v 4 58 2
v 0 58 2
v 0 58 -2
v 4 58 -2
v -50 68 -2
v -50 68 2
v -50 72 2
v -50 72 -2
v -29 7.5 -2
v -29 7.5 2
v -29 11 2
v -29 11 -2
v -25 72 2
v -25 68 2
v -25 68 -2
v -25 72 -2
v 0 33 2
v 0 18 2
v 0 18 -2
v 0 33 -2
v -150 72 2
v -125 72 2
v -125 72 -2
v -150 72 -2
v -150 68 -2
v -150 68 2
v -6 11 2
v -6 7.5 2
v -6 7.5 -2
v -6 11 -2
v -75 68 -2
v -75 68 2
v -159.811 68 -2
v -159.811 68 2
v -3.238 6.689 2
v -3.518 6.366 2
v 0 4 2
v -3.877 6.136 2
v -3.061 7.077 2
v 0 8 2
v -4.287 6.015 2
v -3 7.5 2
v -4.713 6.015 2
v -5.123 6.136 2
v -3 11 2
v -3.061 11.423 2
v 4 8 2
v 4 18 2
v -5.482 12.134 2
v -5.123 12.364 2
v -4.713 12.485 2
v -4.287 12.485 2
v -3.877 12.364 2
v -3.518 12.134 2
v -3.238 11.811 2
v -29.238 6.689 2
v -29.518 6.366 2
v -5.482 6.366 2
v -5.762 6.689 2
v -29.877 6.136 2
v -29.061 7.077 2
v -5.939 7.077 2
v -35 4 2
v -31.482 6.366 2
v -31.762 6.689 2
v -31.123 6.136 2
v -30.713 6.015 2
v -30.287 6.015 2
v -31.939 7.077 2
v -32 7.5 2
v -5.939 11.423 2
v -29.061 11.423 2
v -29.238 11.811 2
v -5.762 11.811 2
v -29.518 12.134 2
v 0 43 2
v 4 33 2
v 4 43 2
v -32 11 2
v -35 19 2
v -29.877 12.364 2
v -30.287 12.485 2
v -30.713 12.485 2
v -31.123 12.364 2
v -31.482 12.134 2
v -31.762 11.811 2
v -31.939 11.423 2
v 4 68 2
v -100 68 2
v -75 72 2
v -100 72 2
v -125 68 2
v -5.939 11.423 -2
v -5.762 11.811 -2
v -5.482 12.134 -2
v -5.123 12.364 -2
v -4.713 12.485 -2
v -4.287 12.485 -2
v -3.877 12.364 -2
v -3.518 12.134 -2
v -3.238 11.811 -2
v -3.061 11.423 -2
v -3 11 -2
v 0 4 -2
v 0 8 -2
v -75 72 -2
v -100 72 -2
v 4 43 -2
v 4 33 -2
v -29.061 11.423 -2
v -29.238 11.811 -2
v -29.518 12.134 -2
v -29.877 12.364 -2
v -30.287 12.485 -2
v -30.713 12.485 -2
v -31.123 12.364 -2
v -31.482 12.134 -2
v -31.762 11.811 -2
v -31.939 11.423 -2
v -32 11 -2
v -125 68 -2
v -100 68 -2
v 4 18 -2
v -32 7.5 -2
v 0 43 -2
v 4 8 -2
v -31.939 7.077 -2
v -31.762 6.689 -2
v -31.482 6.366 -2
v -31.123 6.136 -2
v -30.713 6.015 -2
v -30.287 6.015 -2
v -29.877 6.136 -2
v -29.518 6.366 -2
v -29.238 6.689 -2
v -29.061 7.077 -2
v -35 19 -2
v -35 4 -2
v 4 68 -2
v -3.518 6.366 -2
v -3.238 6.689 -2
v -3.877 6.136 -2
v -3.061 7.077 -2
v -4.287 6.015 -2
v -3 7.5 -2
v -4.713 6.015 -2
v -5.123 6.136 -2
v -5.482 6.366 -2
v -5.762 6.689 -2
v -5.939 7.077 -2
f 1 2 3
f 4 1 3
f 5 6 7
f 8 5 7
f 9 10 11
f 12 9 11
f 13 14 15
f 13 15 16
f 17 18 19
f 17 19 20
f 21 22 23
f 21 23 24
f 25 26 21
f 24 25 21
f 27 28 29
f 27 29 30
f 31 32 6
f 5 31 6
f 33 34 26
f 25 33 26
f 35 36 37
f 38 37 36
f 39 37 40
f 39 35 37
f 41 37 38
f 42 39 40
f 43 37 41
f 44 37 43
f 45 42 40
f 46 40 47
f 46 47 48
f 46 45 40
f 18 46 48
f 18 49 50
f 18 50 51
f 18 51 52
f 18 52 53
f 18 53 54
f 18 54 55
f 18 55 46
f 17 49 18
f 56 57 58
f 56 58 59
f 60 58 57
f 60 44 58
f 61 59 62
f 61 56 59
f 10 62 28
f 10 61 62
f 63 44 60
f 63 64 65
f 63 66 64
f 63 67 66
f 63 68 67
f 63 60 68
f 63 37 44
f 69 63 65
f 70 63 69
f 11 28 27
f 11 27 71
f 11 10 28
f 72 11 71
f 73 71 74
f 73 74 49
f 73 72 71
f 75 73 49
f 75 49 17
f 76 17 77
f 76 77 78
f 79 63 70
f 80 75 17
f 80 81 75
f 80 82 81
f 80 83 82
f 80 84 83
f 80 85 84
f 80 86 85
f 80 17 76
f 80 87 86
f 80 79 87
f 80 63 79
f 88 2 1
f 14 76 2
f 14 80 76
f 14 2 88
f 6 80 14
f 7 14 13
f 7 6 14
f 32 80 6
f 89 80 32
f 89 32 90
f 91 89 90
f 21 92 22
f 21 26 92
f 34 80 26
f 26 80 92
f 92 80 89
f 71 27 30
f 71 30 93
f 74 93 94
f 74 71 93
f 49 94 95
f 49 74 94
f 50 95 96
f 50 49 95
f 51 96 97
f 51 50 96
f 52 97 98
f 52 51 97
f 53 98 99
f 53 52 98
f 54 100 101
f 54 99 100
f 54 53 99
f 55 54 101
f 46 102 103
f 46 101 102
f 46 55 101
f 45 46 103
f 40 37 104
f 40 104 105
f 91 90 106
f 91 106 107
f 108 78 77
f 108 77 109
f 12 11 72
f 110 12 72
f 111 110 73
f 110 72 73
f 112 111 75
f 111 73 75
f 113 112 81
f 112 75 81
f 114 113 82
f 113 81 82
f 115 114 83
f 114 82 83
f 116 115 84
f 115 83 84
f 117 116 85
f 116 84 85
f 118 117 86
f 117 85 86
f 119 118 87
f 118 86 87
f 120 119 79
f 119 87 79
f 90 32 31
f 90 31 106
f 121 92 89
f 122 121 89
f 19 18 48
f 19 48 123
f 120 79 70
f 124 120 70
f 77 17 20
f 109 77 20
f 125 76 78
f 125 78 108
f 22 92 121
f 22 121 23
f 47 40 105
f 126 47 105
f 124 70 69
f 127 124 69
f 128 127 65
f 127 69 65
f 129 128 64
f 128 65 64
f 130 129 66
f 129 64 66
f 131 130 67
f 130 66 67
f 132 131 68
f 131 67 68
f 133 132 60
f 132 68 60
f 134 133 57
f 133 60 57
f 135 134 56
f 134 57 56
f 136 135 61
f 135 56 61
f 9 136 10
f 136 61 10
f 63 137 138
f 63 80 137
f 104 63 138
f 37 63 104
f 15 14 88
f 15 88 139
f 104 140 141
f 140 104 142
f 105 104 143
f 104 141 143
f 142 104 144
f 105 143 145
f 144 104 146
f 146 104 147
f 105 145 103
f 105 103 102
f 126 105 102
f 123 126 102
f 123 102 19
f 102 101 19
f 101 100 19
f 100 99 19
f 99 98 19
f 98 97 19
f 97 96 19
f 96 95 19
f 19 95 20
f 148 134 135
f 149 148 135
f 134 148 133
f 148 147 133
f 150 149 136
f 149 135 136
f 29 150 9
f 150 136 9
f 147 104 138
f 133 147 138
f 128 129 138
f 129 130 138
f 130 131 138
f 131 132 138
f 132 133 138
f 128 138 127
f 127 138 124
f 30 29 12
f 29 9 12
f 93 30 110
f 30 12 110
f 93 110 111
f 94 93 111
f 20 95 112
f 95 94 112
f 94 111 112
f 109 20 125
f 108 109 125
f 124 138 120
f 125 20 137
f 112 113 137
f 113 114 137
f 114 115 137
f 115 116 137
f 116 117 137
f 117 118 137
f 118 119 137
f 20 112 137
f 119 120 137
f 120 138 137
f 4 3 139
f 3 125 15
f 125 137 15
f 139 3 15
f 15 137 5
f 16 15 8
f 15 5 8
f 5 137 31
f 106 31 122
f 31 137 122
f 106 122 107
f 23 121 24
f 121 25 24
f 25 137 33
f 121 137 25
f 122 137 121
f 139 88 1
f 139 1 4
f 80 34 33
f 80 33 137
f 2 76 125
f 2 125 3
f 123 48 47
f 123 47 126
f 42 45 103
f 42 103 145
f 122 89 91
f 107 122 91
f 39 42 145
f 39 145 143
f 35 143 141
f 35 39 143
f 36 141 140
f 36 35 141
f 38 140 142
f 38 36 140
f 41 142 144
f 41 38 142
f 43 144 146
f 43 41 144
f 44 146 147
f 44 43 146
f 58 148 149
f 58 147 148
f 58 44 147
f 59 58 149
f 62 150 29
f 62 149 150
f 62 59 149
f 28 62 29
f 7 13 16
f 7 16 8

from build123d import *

# Parameters (mm, degrees)
BOSS_EXTRUDE1_DEPTH = 2
CUT_EXTRUDE1_REACH  = 186.662
SKETCH3_W           = 25
SKETCH3_H           = 4
CUT_EXTRUDE2_DEPTH  = 185.661853126
SKETCH4_W           = 4
SKETCH4_H           = 10
BOSS_EXTRUDE2_DEPTH = 4


with BuildPart() as part:
    # Sketch1 → Boss-Extrude1 (new, symmetric)
    with BuildSketch(Plane.XY):
        Polygon((0, 4), (0, 72), (-170, 72), (-35, 19), (-35, 4), align=None)
    extrude(amount=BOSS_EXTRUDE1_DEPTH, both=True)

    # Sketch2 → Cut-Extrude1 (cut, up to next)
    with BuildSketch(Plane.XY.offset(2), mode=Mode.PRIVATE) as cut_extrude1_sk1:
        with BuildLine():
            Line((-3, 11), (-3, 7.5))
            ThreePointArc((-3, 7.5), (-4.5, 6), (-6, 7.5))
            Line((-6, 7.5), (-6, 11))
            ThreePointArc((-6, 11), (-4.5, 12.5), (-3, 11))
        make_face()
    cut_extrude1_tool1 = extrude(cut_extrude1_sk1.sketch, amount=-CUT_EXTRUDE1_REACH, mode=Mode.PRIVATE) & part.part
    # Sketch2 → Cut-Extrude1 (cut, up to next)
    with BuildSketch(Plane.XY.offset(2), mode=Mode.PRIVATE) as cut_extrude1_sk2:
        with BuildLine():
            Line((-32, 11), (-32, 7.5))
            ThreePointArc((-32, 7.5), (-30.5, 6), (-29, 7.5))
            Line((-29, 7.5), (-29, 11))
            ThreePointArc((-29, 11), (-30.5, 12.5), (-32, 11))
        make_face()
    cut_extrude1_tool2 = extrude(cut_extrude1_sk2.sketch, amount=-CUT_EXTRUDE1_REACH, mode=Mode.PRIVATE) & part.part
    add(cut_extrude1_tool1.solids().sort_by_distance((-4.5, 9.25, 2))[0], mode=Mode.SUBTRACT)
    add(cut_extrude1_tool2.solids().sort_by_distance((-30.5, 9.25, 2))[0], mode=Mode.SUBTRACT)

    # Sketch3 → Cut-Extrude2 (cut, through all)
    with BuildSketch(Plane.XY.offset(2)):
        with Locations((-62.5, 70)):
            Rectangle(SKETCH3_W, SKETCH3_H)
        with Locations((-12.5, 70)):
            Rectangle(SKETCH3_W, SKETCH3_H)
        with Locations((-112.5, 70)):
            Rectangle(SKETCH3_W, SKETCH3_H)
        with Locations((-162.5, 70)):
            Rectangle(SKETCH3_W, SKETCH3_H)
        with Locations((-212.5, 70)):
            Rectangle(SKETCH3_W, SKETCH3_H)
        with Locations((-262.5, 70)):
            Rectangle(SKETCH3_W, SKETCH3_H)
        with Locations((-312.5, 70)):
            Rectangle(SKETCH3_W, SKETCH3_H)
        with Locations((-362.5, 70)):
            Rectangle(SKETCH3_W, SKETCH3_H)
        with Locations((-412.5, 70)):
            Rectangle(SKETCH3_W, SKETCH3_H)
        with Locations((-462.5, 70)):
            Rectangle(SKETCH3_W, SKETCH3_H)
    extrude(amount=-CUT_EXTRUDE2_DEPTH, mode=Mode.SUBTRACT)

    # Sketch4 → Boss-Extrude2 (add)
    with BuildSketch(Plane(origin=(0, 0, 0), x_dir=(0, 0, -1), z_dir=(1, 0, 0))):
        with Locations((0, 63)):
            Rectangle(SKETCH4_W, SKETCH4_H)
        with Locations((0, 38)):
            Rectangle(SKETCH4_W, SKETCH4_H)
        with Locations((0, 13)):
            Rectangle(SKETCH4_W, SKETCH4_H)
    extrude(amount=BOSS_EXTRUDE2_DEPTH)


solid = part.part
